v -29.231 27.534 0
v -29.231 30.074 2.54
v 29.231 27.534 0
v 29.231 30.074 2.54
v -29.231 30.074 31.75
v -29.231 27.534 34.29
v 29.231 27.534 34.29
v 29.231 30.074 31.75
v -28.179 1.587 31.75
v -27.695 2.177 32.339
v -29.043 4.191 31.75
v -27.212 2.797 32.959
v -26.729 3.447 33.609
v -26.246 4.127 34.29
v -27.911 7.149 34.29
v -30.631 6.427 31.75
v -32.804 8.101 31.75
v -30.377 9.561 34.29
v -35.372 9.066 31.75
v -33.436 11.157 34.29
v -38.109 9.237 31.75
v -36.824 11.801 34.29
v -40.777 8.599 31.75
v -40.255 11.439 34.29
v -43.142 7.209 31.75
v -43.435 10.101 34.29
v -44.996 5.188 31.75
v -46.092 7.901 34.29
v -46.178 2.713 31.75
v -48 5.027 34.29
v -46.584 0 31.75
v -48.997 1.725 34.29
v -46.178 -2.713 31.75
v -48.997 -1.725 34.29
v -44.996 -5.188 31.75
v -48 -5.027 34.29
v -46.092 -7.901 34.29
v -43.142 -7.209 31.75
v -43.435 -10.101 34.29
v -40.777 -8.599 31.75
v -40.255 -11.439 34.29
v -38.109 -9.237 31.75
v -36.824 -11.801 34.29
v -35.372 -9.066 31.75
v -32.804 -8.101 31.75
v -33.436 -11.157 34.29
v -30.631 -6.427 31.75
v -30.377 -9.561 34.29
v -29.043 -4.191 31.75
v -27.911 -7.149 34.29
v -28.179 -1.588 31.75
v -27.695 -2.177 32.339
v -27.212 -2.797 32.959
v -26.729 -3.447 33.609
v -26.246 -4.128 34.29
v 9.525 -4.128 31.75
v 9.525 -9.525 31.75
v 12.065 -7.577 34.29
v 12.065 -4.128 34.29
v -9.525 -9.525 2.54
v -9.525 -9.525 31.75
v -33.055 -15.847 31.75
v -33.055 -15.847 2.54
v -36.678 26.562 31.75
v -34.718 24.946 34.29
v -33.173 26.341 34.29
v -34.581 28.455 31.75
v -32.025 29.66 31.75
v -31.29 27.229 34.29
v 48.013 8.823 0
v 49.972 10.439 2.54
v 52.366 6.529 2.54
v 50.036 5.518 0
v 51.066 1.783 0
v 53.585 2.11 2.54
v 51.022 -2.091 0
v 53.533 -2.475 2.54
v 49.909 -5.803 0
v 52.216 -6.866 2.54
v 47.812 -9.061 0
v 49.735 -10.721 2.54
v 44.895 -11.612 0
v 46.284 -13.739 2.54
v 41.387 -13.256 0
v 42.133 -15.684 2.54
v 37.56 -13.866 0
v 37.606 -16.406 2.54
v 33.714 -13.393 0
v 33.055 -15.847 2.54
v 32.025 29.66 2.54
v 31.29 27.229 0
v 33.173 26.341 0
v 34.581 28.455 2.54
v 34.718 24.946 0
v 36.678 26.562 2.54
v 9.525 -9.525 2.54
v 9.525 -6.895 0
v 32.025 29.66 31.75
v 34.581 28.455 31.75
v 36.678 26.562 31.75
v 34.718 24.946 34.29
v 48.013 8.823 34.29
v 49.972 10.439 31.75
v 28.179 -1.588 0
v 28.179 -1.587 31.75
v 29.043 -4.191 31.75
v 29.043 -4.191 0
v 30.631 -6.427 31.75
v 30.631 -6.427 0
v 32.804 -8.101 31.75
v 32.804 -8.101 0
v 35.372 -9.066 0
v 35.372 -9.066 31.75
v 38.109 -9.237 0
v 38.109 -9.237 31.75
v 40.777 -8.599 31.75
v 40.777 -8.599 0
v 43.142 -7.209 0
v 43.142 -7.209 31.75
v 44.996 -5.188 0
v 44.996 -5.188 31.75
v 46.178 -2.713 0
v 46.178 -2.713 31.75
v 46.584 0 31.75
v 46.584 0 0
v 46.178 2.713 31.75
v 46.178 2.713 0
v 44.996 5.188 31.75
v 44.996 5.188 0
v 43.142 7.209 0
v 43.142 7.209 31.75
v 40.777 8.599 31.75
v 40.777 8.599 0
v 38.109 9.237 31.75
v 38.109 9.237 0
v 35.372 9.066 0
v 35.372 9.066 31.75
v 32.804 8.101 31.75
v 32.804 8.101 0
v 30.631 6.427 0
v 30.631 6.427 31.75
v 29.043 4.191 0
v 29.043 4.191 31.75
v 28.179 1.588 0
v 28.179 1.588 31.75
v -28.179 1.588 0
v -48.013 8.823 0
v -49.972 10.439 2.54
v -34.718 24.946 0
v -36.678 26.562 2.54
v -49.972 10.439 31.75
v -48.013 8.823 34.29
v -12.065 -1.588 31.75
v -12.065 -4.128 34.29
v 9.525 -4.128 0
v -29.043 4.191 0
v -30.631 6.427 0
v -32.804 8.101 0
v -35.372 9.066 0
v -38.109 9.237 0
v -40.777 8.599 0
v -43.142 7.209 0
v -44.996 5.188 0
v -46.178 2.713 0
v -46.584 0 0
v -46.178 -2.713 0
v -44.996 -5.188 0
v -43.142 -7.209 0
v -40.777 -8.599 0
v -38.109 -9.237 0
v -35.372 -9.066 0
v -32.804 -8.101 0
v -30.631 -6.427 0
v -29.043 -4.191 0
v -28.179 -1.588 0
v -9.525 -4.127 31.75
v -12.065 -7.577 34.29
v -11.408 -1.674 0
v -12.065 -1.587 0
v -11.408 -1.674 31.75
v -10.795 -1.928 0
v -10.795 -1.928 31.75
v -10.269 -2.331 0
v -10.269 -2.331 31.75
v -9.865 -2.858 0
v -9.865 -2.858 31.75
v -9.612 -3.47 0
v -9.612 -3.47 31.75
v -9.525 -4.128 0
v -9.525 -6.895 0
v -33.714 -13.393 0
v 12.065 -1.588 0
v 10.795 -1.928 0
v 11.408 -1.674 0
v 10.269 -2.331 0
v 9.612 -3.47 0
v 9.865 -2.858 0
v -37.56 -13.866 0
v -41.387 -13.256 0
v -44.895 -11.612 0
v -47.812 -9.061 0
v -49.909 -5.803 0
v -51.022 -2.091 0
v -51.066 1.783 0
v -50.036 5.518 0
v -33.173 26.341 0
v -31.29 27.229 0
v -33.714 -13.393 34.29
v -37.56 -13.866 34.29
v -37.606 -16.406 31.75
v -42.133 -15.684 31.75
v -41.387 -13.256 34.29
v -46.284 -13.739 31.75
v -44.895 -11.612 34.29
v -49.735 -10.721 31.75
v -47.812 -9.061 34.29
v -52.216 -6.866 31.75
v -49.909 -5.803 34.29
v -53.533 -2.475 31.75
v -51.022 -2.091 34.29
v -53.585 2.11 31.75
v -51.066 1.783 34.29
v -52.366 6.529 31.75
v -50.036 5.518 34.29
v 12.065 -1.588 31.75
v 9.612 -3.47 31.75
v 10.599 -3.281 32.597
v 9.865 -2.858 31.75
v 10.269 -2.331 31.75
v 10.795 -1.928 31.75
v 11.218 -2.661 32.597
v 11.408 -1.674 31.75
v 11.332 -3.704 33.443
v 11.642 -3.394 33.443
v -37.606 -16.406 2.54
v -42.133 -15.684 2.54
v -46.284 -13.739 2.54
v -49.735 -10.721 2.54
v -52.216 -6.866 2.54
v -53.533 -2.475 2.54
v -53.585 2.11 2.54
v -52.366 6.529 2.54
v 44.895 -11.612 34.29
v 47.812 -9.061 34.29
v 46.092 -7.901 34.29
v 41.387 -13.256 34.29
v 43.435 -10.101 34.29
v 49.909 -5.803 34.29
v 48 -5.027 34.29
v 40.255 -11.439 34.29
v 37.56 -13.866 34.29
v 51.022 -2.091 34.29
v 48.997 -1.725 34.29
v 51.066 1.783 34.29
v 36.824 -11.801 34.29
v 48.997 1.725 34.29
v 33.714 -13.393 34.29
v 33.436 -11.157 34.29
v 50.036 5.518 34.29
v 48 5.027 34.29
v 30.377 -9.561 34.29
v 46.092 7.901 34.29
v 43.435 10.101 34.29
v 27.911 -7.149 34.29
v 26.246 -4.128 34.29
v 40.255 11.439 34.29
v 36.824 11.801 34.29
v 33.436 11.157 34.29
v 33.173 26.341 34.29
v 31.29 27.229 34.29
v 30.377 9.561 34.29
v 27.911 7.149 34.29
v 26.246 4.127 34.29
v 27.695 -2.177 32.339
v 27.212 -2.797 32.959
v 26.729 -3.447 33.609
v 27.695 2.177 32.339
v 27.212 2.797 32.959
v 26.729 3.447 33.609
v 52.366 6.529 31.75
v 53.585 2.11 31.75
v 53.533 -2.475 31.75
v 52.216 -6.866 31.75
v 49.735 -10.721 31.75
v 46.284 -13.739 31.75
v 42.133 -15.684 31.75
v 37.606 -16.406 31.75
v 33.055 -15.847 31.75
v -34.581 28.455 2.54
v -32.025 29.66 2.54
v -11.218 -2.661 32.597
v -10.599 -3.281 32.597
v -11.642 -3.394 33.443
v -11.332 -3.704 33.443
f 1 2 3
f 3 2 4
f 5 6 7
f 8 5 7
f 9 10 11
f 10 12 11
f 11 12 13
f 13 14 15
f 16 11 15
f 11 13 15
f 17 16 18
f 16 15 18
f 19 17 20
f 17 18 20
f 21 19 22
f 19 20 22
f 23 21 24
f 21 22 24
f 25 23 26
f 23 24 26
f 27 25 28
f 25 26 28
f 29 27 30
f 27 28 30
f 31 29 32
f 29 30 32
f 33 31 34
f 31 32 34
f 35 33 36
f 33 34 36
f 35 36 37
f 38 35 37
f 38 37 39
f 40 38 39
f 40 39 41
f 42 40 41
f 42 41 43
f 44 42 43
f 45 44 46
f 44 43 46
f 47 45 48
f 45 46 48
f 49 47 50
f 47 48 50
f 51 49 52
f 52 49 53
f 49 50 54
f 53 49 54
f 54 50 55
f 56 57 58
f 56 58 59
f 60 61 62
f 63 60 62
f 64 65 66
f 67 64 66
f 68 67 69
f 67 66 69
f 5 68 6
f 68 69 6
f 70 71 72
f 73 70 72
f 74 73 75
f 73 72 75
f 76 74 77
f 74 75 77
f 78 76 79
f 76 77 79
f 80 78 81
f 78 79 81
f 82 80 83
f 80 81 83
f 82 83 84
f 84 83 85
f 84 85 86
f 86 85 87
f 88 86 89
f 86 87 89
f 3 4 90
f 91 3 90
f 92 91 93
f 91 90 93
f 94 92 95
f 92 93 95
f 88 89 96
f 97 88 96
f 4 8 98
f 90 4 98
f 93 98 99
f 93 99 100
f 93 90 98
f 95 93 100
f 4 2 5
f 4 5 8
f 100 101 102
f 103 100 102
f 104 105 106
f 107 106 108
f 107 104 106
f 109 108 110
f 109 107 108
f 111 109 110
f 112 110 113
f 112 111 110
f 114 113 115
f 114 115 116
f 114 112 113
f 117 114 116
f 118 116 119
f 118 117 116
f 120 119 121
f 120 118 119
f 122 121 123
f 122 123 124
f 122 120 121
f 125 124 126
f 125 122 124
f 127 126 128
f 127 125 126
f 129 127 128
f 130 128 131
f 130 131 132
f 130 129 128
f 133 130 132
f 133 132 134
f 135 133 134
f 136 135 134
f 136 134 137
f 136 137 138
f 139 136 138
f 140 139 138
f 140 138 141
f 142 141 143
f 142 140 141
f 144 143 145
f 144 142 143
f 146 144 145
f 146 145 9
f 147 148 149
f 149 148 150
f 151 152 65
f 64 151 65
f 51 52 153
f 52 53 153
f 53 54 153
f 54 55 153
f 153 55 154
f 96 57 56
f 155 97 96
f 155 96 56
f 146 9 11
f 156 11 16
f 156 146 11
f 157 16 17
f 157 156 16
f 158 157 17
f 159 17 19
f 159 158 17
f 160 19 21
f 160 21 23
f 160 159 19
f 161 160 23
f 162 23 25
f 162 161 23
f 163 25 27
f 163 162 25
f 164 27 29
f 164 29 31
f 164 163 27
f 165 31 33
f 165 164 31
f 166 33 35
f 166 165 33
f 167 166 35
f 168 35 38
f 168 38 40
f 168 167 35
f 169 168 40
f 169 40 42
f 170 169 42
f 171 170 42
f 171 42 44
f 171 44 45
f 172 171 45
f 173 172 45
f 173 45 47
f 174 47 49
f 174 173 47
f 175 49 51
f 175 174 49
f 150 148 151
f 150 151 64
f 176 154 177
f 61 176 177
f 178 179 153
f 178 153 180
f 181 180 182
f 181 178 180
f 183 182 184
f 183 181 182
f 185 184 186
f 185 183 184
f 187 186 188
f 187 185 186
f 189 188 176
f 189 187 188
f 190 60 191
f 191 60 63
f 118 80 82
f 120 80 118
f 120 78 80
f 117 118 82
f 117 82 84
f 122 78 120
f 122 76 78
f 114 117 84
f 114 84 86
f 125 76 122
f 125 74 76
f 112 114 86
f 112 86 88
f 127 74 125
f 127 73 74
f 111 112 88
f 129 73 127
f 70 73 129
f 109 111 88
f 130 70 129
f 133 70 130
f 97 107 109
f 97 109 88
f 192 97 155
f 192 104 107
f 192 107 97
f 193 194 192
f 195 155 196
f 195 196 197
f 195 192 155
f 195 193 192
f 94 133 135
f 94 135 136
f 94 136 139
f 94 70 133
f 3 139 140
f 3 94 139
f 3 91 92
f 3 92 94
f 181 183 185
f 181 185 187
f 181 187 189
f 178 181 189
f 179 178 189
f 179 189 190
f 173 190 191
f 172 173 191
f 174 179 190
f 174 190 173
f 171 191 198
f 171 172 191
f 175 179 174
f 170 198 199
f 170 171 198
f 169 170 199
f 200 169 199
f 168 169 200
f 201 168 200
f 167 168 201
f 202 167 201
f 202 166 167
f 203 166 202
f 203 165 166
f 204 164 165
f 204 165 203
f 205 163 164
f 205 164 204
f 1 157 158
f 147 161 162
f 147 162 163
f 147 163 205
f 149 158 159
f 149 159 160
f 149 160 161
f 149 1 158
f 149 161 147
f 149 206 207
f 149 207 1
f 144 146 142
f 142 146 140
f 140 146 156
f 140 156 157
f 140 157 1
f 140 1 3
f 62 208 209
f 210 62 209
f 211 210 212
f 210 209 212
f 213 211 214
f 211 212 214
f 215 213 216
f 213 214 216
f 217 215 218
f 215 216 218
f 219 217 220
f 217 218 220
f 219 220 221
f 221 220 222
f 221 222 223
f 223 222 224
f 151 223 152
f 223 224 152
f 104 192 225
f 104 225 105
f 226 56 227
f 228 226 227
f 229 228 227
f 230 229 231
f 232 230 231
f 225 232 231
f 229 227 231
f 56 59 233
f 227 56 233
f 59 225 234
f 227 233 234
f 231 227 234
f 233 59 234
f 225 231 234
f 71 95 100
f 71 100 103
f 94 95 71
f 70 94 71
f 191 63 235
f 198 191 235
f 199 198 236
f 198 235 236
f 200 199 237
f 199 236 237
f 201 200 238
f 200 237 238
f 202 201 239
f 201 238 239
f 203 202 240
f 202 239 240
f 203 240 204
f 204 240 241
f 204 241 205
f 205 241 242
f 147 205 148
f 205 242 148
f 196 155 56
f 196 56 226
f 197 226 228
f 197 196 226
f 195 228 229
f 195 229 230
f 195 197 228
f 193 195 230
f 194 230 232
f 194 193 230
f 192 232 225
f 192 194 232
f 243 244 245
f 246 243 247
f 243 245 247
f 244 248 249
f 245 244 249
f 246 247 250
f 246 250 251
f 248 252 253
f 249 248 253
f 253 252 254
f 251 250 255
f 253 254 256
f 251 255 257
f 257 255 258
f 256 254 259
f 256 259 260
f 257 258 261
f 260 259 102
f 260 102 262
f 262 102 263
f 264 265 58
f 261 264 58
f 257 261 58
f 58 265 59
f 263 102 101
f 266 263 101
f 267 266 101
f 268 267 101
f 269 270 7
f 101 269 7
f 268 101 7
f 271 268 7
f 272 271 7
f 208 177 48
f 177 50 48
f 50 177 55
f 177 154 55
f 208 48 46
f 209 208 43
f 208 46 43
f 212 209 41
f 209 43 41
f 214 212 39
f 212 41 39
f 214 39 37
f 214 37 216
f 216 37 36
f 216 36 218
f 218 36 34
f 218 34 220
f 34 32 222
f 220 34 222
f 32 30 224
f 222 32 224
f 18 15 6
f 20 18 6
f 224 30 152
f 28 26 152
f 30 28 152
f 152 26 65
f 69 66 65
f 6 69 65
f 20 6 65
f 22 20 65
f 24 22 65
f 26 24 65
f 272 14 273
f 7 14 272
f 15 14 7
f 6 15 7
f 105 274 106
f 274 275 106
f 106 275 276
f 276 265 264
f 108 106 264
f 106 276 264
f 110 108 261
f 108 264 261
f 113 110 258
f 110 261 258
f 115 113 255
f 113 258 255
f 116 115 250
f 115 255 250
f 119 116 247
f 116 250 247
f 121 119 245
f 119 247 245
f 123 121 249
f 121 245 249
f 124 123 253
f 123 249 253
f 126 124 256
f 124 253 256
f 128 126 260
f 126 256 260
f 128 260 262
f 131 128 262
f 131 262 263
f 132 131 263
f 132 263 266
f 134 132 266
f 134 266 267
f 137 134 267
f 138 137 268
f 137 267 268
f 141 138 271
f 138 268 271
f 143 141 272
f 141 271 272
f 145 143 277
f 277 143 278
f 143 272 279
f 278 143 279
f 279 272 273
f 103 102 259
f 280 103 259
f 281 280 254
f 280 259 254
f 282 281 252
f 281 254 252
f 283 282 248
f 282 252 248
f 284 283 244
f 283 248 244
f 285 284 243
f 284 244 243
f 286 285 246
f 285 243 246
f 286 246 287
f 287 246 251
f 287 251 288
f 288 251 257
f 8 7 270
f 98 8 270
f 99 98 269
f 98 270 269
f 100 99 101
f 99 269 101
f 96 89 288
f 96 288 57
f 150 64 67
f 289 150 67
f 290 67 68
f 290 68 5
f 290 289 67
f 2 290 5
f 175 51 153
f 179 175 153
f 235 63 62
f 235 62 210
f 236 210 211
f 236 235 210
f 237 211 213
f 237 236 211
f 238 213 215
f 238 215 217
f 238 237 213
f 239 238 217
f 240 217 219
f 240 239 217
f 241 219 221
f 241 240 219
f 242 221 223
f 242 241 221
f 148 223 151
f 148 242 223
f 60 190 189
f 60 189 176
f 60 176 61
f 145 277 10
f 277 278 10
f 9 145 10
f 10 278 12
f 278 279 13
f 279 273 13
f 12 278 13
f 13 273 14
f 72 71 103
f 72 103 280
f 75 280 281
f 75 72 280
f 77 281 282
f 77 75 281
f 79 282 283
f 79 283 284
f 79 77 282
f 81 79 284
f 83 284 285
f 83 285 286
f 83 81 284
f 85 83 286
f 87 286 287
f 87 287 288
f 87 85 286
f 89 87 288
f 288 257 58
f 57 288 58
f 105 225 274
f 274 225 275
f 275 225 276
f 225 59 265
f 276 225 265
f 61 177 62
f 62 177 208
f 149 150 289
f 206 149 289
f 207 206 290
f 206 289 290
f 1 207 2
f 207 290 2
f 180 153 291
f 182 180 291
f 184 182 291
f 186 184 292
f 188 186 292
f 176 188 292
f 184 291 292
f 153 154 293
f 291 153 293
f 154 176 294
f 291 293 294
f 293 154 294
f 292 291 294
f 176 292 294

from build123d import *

# Parameters (mm, degrees)
BOSS_EXTRUDE2_DEPTH = 34.29
CHAMFER1_SIZE       = 2.54
CHAMFER2_SIZE       = 2.54


with BuildPart() as part:
    # Sketch2 → Boss-Extrude2 (new body)
    with BuildSketch(Plane.XY):
        with BuildLine():
            Line((-29.230640855, 30.0736), (29.230640855, 30.0736))
            ThreePointArc((29.230640855, 30.0736), (33.347275907, 29.151687047), (36.677508311, 26.562061635))
            Line((36.677508311, 26.562061635), (49.972274675, 10.43878478))
            ThreePointArc((49.972274675, 10.43878478), (51.110407437, -8.880095747), (33.055391111, -15.846506335))
            Line((33.055391111, -15.846506335), (9.525, -9.525))
            Line((9.525, -9.525), (9.525, -4.1275))
            ThreePointArc((9.525, -4.1275), (10.268948776, -2.331448776), (12.065, -1.5875))
            Line((12.065, -1.5875), (28.178527264, -1.5875))
            ThreePointArc((28.178527264, -1.5875), (46.5836, 0), (28.178527264, 1.5875))
            Line((28.178527264, 1.5875), (-28.178527264, 1.5875))
            ThreePointArc((-28.178527264, 1.5875), (-46.5836, 0), (-28.178527264, -1.5875))
            Line((-28.178527264, -1.5875), (-12.065, -1.5875))
            ThreePointArc((-12.065, -1.5875), (-10.268948776, -2.331448776), (-9.525, -4.1275))
            Line((-9.525, -4.1275), (-9.525, -9.525))
            Line((-9.525, -9.525), (-33.055391111, -15.846506335))
            ThreePointArc((-33.055391111, -15.846506335), (-51.110407437, -8.880095747), (-49.972274675, 10.43878478))
            Line((-49.972274675, 10.43878478), (-36.677508311, 26.562061635))
            ThreePointArc((-36.677508311, 26.562061635), (-33.347275907, 29.151687047), (-29.230640855, 30.0736))
        make_face()
    extrude(amount=BOSS_EXTRUDE2_DEPTH)

    # Chamfer1
    chamfer1_edges = [part.edges().sort_by_distance(p)[0] for p in [
        (33.347275907, 29.151687047, 34.29),
        (0, 30.0736, 34.29),
        (-33.347275907, 29.151687047, 34.29),
        (-43.324891493, 18.500423208, 34.29),
        (-51.110407437, -8.880095747, 34.29),
        (-21.290195556, -12.685753168, 34.29),
        (-9.525, -6.82625, 34.29),
        (-10.268948776, -2.331448776, 34.29),
        (-20.121763632, -1.5875, 34.29),
        (-46.5836, 0, 34.29),
        (51.110407437, -8.880095747, 34.29),
        (0, 1.5875, 34.29),
        (46.5836, 0, 34.29),
        (20.121763632, -1.5875, 34.29),
        (10.268948776, -2.331448776, 34.29),
        (9.525, -6.82625, 34.29),
        (21.290195556, -12.685753168, 34.29),
        (43.324891493, 18.500423208, 34.29),
    ]]
    chamfer(chamfer1_edges, length=CHAMFER1_SIZE)

    # Chamfer2
    chamfer2_edges = [part.edges().sort_by_distance(p)[0] for p in [
        (21.290195556, -12.685753168, 0),
        (-21.290195556, -12.685753168, 0),
        (-51.110407437, -8.880095747, 0),
        (-43.324891493, 18.500423208, 0),
        (-33.347275907, 29.151687047, 0),
        (0, 30.0736, 0),
        (33.347275907, 29.151687047, 0),
        (43.324891493, 18.500423208, 0),
        (51.110407437, -8.880095747, 0),
    ]]
    chamfer(chamfer2_edges, length=CHAMFER2_SIZE)


solid = part.part
